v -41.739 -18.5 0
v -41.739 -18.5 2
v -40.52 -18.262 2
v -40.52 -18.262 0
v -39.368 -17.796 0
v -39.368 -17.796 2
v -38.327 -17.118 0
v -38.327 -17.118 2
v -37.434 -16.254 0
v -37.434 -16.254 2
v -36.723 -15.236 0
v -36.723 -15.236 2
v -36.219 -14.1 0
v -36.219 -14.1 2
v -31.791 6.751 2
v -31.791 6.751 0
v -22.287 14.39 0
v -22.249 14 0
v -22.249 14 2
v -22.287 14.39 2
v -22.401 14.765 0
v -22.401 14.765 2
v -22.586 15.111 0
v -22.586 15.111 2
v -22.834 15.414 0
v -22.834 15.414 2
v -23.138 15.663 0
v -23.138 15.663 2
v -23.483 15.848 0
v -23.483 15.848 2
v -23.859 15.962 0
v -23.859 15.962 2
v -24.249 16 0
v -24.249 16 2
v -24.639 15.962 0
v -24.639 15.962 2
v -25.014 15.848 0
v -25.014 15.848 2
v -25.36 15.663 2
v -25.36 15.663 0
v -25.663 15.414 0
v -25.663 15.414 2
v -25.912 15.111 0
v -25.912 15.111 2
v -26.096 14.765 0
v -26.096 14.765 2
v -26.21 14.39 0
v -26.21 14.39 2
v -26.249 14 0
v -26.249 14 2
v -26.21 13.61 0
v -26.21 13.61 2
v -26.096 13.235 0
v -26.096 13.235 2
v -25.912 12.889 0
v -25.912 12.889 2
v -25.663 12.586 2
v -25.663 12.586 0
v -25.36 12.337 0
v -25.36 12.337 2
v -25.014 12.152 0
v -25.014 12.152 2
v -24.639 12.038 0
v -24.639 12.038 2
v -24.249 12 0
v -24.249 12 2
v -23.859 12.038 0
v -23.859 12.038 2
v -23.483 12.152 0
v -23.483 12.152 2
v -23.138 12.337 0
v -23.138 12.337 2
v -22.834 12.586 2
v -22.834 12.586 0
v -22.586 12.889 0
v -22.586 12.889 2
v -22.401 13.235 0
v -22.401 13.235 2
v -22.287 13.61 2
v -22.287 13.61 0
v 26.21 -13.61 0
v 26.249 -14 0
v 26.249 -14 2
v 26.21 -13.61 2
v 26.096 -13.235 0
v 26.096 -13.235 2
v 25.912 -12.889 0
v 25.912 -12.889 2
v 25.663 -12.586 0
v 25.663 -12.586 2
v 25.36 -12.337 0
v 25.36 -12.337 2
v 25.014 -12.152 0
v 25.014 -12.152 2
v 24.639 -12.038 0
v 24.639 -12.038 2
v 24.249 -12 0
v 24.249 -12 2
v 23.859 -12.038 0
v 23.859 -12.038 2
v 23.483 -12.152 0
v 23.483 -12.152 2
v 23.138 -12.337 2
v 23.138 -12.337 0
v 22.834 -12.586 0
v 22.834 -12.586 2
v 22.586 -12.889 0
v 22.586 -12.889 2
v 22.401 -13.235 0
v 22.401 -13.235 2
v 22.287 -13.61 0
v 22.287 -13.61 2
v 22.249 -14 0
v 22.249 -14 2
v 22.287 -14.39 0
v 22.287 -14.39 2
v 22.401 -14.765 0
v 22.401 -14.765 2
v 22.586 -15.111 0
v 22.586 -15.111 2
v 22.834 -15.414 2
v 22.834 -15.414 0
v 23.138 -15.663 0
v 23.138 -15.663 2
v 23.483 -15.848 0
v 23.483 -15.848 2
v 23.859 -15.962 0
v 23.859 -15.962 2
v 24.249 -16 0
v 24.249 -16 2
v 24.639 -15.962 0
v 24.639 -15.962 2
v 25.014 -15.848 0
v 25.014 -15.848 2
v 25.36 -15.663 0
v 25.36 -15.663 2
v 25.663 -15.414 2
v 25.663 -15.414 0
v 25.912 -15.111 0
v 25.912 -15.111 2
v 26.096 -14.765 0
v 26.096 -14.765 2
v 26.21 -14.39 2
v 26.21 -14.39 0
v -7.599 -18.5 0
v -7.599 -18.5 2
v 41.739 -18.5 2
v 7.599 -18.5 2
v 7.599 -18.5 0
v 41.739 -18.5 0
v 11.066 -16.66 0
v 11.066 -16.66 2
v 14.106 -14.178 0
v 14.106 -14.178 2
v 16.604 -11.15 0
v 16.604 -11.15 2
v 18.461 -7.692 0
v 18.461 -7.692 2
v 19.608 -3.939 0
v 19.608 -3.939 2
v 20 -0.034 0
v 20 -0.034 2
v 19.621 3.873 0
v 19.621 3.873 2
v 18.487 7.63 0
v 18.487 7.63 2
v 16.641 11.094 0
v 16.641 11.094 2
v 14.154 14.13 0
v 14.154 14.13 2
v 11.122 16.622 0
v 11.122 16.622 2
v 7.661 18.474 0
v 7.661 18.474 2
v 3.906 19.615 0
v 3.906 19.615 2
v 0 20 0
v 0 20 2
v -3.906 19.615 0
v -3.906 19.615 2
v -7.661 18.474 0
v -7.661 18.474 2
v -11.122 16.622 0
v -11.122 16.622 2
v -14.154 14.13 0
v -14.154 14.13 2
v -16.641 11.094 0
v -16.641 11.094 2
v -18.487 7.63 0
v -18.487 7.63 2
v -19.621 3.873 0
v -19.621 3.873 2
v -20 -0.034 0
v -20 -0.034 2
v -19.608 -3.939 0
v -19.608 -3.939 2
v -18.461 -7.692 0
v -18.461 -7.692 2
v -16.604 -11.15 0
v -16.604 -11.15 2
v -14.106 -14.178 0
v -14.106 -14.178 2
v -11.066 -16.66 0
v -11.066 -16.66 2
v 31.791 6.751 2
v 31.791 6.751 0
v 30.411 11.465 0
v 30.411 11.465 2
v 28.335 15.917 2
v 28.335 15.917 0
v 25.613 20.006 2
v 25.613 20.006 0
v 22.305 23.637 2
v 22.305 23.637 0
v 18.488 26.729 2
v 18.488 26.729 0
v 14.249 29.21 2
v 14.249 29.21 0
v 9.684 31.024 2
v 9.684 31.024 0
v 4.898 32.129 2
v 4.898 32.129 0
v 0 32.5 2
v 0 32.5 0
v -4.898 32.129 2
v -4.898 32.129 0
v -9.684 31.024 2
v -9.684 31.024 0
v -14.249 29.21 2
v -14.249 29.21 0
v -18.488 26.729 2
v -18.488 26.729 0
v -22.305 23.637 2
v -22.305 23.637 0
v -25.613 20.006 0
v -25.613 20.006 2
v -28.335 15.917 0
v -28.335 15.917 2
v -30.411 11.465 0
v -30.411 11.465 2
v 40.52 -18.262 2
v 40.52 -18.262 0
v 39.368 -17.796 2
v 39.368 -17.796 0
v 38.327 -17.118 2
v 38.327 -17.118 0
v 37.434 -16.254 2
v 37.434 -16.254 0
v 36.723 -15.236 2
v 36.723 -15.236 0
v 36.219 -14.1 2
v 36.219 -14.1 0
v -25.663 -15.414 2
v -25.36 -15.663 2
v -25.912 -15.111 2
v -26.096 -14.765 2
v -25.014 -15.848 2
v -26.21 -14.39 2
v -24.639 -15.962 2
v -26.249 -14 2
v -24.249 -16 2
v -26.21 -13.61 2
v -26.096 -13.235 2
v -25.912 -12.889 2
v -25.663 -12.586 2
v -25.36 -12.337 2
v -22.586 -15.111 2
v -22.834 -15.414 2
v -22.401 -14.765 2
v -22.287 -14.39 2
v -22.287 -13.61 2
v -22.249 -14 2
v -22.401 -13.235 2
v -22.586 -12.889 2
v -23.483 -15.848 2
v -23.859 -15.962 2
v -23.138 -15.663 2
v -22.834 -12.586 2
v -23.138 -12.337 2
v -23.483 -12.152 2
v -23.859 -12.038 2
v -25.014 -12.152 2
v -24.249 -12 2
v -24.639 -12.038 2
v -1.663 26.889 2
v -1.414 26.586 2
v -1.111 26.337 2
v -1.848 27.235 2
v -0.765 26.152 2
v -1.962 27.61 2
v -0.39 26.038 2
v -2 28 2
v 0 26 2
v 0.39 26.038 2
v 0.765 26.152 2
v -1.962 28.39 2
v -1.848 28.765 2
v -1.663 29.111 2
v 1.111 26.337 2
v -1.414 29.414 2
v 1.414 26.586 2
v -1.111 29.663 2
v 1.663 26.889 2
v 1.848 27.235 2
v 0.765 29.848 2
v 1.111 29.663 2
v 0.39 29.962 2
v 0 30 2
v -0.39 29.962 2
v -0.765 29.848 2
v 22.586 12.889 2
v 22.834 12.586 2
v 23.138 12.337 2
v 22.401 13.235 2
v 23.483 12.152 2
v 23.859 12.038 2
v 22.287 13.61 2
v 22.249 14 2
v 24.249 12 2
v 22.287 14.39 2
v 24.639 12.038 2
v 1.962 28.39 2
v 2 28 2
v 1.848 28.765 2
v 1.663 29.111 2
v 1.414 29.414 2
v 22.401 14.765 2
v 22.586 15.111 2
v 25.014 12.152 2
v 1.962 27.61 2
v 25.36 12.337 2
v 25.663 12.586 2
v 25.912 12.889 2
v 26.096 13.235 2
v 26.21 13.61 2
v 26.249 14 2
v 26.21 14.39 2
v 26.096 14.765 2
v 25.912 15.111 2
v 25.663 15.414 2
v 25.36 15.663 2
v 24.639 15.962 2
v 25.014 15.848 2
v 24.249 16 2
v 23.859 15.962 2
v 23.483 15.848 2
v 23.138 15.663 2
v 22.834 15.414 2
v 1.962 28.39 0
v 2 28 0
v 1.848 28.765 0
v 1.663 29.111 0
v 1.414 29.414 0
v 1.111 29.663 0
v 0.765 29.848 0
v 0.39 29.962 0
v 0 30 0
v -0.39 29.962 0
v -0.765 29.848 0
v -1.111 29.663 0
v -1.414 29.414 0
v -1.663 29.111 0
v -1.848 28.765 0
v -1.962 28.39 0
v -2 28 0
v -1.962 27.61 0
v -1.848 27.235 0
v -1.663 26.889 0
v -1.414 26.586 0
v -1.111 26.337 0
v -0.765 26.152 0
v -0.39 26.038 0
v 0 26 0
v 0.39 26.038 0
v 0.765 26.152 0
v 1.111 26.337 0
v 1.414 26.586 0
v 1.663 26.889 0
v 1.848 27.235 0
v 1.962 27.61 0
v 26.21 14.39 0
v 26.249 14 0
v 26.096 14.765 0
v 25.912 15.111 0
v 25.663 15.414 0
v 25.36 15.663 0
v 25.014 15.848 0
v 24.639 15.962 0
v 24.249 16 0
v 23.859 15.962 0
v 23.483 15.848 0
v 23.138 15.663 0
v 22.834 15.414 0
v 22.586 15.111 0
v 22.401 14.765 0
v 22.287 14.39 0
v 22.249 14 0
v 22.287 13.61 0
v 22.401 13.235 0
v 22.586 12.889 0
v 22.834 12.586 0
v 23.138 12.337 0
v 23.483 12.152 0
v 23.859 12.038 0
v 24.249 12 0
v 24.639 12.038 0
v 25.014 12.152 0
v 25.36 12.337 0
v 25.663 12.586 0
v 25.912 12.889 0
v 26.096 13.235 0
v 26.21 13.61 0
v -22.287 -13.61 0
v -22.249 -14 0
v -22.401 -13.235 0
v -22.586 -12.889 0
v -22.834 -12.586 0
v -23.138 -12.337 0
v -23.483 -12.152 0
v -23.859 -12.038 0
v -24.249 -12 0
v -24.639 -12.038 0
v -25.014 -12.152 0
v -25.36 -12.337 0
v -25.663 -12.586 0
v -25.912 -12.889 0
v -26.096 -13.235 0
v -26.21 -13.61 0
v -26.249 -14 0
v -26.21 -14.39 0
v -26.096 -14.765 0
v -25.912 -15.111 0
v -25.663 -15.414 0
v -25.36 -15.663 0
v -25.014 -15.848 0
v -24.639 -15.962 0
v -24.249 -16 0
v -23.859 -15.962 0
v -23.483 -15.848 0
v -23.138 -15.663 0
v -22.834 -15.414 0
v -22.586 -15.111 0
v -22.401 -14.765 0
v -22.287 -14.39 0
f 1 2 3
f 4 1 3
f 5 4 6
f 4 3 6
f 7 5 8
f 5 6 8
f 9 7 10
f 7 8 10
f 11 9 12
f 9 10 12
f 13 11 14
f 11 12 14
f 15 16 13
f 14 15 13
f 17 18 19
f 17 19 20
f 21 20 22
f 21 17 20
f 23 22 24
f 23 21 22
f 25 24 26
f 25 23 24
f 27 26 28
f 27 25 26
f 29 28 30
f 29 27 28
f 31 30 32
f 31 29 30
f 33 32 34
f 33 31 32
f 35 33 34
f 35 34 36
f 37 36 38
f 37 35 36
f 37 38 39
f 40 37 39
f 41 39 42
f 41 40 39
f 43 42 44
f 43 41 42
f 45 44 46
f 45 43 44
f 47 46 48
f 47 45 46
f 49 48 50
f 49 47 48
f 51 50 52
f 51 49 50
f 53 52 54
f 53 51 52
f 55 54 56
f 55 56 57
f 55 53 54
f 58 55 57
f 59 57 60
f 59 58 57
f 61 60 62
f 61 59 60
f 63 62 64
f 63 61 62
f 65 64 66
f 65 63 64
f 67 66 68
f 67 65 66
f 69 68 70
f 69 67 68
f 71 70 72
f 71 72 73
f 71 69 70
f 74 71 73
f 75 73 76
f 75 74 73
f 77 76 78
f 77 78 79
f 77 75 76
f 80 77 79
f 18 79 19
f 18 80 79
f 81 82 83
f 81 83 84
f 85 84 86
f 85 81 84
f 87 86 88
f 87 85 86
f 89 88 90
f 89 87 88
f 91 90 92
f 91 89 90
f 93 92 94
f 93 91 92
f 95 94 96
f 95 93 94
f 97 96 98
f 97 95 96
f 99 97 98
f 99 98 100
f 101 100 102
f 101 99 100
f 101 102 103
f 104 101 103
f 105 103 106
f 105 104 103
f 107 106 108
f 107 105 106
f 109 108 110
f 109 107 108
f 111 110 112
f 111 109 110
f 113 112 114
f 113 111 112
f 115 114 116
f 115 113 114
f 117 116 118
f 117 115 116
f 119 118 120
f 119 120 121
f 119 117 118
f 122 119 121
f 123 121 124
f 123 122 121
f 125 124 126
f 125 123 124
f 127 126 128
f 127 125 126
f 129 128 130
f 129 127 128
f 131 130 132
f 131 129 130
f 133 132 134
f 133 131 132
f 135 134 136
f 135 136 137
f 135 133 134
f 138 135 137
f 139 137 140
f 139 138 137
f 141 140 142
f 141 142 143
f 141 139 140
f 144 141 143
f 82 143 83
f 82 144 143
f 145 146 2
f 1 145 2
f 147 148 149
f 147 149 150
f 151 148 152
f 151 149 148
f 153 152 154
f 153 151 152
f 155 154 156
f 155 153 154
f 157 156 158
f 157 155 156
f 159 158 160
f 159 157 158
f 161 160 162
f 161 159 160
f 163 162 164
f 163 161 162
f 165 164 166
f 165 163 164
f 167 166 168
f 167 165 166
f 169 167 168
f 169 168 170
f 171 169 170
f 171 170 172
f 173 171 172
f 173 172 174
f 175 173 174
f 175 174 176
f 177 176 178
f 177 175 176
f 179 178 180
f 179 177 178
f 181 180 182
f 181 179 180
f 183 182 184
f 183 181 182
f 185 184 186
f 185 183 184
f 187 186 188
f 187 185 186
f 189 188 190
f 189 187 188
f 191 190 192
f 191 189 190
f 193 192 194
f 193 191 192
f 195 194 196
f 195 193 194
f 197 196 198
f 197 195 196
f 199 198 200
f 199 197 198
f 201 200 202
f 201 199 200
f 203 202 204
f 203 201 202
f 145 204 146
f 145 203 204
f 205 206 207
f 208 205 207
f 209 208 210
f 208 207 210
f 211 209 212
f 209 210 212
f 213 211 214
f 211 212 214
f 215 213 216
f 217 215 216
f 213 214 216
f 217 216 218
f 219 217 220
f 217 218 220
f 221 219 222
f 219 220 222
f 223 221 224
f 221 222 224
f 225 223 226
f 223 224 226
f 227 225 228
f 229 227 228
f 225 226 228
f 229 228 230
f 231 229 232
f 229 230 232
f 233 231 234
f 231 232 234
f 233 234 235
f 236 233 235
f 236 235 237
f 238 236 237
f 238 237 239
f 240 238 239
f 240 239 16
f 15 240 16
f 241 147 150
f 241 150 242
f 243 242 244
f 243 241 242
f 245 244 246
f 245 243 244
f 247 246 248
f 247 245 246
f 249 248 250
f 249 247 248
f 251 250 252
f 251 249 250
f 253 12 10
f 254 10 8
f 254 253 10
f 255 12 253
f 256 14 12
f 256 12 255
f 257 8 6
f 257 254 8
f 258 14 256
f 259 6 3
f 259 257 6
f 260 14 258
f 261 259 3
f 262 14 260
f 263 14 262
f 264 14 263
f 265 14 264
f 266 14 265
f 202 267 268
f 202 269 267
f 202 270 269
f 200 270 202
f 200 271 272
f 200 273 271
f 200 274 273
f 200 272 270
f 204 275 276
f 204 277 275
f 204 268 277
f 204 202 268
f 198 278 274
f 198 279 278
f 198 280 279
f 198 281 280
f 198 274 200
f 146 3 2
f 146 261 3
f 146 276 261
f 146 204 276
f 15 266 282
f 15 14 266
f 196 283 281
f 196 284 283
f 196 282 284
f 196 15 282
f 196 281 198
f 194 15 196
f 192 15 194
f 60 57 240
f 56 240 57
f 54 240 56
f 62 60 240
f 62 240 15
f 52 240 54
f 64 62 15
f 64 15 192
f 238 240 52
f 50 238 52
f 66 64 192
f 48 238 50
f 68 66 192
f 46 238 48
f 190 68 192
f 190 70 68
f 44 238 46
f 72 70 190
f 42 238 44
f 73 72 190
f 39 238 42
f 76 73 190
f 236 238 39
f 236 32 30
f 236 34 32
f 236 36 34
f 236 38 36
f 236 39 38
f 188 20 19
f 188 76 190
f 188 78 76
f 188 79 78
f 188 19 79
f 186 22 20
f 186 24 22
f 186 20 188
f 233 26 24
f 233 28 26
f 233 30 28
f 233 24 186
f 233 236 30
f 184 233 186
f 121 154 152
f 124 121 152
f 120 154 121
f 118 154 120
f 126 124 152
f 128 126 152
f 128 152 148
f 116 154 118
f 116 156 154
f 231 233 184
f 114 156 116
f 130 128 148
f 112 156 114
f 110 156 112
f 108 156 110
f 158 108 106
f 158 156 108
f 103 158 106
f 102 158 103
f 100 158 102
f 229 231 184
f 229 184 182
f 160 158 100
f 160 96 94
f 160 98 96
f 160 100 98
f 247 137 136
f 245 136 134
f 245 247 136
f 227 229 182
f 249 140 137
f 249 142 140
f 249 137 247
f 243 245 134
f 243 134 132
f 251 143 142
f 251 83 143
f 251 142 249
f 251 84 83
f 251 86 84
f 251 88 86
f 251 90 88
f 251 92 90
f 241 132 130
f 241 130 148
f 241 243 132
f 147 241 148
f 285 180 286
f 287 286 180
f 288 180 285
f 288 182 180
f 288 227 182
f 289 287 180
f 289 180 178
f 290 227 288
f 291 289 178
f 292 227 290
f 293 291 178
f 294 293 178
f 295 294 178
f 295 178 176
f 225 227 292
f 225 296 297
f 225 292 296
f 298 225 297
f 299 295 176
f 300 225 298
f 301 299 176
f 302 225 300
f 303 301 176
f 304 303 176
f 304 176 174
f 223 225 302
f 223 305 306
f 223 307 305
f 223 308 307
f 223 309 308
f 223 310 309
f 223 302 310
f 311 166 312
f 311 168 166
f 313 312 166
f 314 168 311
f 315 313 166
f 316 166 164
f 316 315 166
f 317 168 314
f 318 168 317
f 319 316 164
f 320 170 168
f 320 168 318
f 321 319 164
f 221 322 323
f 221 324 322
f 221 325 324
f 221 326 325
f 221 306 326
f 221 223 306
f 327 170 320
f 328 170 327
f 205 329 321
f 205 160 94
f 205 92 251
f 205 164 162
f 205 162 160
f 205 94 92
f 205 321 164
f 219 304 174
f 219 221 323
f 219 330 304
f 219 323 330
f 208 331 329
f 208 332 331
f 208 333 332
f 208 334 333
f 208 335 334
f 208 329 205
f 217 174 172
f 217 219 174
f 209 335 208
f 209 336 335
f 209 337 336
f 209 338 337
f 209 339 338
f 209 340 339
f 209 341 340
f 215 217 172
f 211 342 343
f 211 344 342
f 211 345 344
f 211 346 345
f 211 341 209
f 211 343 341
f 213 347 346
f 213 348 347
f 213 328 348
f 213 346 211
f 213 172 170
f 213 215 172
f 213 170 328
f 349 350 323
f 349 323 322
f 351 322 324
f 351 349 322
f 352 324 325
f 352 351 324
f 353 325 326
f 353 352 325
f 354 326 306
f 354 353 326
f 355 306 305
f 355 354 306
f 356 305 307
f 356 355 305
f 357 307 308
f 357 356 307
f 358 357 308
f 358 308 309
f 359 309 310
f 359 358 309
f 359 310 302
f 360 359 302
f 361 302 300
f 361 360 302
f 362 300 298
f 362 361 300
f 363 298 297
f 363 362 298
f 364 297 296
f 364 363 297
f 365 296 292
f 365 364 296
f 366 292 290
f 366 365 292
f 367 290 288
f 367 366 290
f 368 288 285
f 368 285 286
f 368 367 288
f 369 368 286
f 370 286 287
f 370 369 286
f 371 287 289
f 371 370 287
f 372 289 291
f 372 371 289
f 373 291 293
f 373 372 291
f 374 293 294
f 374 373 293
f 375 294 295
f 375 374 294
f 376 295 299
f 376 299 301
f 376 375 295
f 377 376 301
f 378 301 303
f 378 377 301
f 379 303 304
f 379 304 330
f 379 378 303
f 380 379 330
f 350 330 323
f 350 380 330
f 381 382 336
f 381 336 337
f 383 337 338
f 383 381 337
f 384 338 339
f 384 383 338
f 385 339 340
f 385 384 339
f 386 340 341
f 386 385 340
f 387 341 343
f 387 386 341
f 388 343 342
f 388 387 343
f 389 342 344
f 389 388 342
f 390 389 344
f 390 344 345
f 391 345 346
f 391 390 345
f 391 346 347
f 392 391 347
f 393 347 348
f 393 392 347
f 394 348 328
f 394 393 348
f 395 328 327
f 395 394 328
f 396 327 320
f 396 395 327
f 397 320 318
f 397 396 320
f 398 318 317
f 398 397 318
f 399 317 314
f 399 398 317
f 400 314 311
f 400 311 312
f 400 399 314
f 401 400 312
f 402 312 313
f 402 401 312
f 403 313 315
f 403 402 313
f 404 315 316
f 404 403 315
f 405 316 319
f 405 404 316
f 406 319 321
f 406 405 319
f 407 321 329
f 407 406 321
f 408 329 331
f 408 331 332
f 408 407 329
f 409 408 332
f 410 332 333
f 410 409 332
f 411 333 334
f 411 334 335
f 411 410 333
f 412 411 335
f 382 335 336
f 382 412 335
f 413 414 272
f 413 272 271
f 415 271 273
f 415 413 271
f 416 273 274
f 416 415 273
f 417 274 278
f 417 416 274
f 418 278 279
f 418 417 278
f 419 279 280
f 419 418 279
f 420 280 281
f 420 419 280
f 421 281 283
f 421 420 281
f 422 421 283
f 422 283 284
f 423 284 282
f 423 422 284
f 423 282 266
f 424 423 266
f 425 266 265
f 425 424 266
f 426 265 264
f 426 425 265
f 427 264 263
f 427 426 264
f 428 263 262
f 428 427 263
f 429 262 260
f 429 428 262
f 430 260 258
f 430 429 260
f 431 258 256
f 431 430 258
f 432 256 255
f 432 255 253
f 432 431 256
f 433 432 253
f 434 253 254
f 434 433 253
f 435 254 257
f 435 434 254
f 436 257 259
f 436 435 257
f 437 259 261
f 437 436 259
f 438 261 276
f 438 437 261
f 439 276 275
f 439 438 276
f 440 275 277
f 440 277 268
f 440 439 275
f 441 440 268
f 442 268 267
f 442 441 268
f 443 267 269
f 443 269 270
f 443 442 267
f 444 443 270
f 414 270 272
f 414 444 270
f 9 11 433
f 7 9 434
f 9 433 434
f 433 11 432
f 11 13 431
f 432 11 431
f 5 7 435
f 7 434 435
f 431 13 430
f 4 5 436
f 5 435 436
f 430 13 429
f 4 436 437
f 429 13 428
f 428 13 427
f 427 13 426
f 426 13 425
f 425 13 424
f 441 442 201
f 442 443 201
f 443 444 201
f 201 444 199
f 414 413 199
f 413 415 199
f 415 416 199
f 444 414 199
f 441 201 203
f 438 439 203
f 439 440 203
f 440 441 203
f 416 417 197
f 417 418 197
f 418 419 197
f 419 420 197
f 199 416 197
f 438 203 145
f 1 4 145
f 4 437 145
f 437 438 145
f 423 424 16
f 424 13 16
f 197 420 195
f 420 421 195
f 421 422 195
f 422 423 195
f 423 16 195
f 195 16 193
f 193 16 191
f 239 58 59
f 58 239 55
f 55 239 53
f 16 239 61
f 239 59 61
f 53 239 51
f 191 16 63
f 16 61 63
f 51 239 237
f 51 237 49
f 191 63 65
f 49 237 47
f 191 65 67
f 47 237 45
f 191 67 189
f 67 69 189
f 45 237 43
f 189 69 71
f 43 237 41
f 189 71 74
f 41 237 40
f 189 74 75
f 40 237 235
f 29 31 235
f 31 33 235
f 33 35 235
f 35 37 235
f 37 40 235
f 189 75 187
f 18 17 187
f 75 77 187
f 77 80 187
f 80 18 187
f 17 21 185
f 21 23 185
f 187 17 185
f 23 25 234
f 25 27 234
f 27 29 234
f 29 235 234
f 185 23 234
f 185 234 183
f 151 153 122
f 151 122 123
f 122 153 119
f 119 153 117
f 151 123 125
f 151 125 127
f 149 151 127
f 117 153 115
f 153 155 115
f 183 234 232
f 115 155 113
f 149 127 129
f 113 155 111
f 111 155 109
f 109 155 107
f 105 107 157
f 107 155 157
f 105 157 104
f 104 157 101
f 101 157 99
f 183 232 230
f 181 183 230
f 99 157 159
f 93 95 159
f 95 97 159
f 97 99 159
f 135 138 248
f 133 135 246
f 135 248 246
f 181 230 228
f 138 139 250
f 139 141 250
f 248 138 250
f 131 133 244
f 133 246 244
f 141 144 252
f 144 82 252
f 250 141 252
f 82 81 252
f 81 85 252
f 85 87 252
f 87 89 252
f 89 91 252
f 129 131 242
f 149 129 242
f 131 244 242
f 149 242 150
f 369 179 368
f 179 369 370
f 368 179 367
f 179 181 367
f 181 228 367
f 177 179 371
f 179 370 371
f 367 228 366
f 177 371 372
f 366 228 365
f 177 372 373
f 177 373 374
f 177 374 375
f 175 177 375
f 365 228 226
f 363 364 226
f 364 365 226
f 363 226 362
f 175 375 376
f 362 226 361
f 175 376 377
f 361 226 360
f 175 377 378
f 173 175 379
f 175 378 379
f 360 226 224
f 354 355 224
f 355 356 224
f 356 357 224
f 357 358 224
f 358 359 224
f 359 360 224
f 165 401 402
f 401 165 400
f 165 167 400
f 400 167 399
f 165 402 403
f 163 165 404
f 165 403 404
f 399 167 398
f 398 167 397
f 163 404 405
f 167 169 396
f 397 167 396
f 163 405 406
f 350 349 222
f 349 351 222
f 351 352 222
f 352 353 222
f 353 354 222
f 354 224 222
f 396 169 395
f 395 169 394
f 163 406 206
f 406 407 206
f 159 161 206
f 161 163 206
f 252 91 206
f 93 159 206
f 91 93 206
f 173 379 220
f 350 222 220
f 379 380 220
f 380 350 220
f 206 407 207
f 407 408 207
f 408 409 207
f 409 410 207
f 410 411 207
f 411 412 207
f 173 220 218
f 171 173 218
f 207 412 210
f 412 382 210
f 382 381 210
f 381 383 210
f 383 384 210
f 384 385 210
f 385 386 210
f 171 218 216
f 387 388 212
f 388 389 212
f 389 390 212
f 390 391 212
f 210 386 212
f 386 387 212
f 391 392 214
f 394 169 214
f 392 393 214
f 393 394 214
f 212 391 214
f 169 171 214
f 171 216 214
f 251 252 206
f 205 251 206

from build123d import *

# Parameters (mm, degrees)
SKETCH1_R           = 20
SKETCH1_R_2         = 2
SKETCH1_R_3         = 2.5
BOSS_EXTRUDE1_DEPTH = 2
SKETCH2_W           = 100.062981373
SKETCH2_H           = 60.5
CUT_EXTRUDE1_DEPTH  = 10
BOSS_EXTRUDE2_DEPTH = 2


with BuildPart() as part:
    # Sketch1 → Boss-Extrude1 (new body)
    with BuildSketch(Plane.XY):
        with BuildLine():
            Line((-50, -79), (50, -79))
            Line((50, -79), (31.791156311, 6.750731842))
            ThreePointArc((31.791156311, 6.750731842), (0, 32.5), (-31.791156311, 6.750731842))
            Line((-31.791156311, 6.750731842), (-50, -79))
        make_face()
        Circle(SKETCH1_R, mode=Mode.SUBTRACT)
        with Locations((0, 28)):
            Circle(SKETCH1_R_2, mode=Mode.SUBTRACT)
        with Locations((24.248711306, 14)):
            Circle(SKETCH1_R_2, mode=Mode.SUBTRACT)
        with Locations((24.248711306, -14)):
            Circle(SKETCH1_R_2, mode=Mode.SUBTRACT)
        with Locations((-24.248711306, -14)):
            Circle(SKETCH1_R_2, mode=Mode.SUBTRACT)
        with Locations((-24.248711306, 14)):
            Circle(SKETCH1_R_2, mode=Mode.SUBTRACT)
        with Locations((0, -71.5)):
            Circle(SKETCH1_R_3, mode=Mode.SUBTRACT)
        with Locations((23, -46.5)):
            Circle(SKETCH1_R_3, mode=Mode.SUBTRACT)
        with Locations((-23, -46.5)):
            Circle(SKETCH1_R_3, mode=Mode.SUBTRACT)
    extrude(amount=BOSS_EXTRUDE1_DEPTH)

    # Sketch2 → Cut-Extrude1 (cut)
    with BuildSketch(Plane(origin=(0, 0, 0), x_dir=(-1, 0, 0), z_dir=(0, 0, -1))):
        with Locations((0.031490687, -48.75)):
            Rectangle(SKETCH2_W, SKETCH2_H)
    extrude(amount=-CUT_EXTRUDE1_DEPTH, mode=Mode.SUBTRACT)

    # Sketch3 → Boss-Extrude2 (add)
    with BuildSketch(Plane.XY.offset(2)):
        with BuildLine():
            Line((-36.218763373, -14.100155361), (-37.153053746, -18.5))
            Line((-37.153053746, -18.5), (-41.739173899, -18.5))
            ThreePointArc((-41.739173899, -18.5), (-38.327081149, -17.117989866), (-36.218763373, -14.100155361))
        make_face()
    boss_extrude2 = extrude(amount=-BOSS_EXTRUDE2_DEPTH)

    # Mirror1: Boss-Extrude2 across plane
    add(boss_extrude2.mirror(Plane(origin=(0, 0, 0), x_dir=(0, 0, 1), z_dir=(1, 0, 0))))


solid = part.part
